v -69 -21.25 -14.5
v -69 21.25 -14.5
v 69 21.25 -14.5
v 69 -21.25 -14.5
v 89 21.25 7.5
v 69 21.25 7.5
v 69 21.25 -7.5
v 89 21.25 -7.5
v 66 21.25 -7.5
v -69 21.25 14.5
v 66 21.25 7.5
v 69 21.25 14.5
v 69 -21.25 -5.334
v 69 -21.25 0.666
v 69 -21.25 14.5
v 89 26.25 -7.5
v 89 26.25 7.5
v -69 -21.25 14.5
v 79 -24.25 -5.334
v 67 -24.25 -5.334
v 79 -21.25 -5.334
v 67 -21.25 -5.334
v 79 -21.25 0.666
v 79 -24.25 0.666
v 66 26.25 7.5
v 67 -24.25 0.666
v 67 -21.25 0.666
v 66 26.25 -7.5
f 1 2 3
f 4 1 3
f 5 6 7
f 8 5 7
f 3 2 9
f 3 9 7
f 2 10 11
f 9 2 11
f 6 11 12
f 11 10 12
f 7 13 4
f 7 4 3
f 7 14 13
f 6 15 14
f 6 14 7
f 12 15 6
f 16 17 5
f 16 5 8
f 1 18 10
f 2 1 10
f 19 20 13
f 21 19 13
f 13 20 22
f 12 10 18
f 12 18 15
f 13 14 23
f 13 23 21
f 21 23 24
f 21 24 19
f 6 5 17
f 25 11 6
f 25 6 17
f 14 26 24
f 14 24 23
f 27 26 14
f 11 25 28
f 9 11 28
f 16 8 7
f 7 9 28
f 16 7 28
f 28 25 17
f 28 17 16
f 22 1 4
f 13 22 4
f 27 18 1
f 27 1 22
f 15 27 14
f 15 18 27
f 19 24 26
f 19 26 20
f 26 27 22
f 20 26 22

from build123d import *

# Parameters (mm, degrees)
SKETCH1_W                = 138
SKETCH1_H                = 42.5
BOSS_EXTRUDE1_DEPTH      = 14.5
BOSS_EXTRUDE2_DEPTH      = 20
BOSS_EXTRUDE2_DEPTH_BACK = 3
BOSS_EXTRUDE2_START      = 69
SKETCH2_W                = 15
SKETCH2_H                = 5
BOSS_EXTRUDE3_DEPTH      = 10
BOSS_EXTRUDE3_DEPTH_BACK = 2
BOSS_EXTRUDE3_START      = 69
SKETCH2_3_W              = 6
SKETCH2_3_H              = 3


with BuildPart() as part:
    # Sketch1 → Boss-Extrude1 (new, symmetric)
    with BuildSketch(Plane.XY):
        Rectangle(SKETCH1_W, SKETCH1_H)
    extrude(amount=BOSS_EXTRUDE1_DEPTH, both=True)

    # Sketch2 → Boss-Extrude2 (add, two sides: drawn at the far end of the back side and taken through both)
    with BuildSketch(Plane(origin=(0, 0, 0), x_dir=(0, 0, -1), z_dir=(1, 0, 0)).offset(BOSS_EXTRUDE2_START - BOSS_EXTRUDE2_DEPTH_BACK)):
        with Locations((0, 23.75)):
            Rectangle(SKETCH2_W, SKETCH2_H)
    extrude(amount=BOSS_EXTRUDE2_DEPTH + BOSS_EXTRUDE2_DEPTH_BACK)

    # Sketch2<3> → Boss-Extrude3 (add, two sides: drawn at the far end of the back side and taken through both)
    with BuildSketch(Plane(origin=(0, 0, 0), x_dir=(0, 0, -1), z_dir=(1, 0, 0)).offset(BOSS_EXTRUDE3_START - BOSS_EXTRUDE3_DEPTH_BACK)):
        with Locations((2.334145167, -22.75)):
            Rectangle(SKETCH2_3_W, SKETCH2_3_H)
    extrude(amount=BOSS_EXTRUDE3_DEPTH + BOSS_EXTRUDE3_DEPTH_BACK)


solid = part.part
